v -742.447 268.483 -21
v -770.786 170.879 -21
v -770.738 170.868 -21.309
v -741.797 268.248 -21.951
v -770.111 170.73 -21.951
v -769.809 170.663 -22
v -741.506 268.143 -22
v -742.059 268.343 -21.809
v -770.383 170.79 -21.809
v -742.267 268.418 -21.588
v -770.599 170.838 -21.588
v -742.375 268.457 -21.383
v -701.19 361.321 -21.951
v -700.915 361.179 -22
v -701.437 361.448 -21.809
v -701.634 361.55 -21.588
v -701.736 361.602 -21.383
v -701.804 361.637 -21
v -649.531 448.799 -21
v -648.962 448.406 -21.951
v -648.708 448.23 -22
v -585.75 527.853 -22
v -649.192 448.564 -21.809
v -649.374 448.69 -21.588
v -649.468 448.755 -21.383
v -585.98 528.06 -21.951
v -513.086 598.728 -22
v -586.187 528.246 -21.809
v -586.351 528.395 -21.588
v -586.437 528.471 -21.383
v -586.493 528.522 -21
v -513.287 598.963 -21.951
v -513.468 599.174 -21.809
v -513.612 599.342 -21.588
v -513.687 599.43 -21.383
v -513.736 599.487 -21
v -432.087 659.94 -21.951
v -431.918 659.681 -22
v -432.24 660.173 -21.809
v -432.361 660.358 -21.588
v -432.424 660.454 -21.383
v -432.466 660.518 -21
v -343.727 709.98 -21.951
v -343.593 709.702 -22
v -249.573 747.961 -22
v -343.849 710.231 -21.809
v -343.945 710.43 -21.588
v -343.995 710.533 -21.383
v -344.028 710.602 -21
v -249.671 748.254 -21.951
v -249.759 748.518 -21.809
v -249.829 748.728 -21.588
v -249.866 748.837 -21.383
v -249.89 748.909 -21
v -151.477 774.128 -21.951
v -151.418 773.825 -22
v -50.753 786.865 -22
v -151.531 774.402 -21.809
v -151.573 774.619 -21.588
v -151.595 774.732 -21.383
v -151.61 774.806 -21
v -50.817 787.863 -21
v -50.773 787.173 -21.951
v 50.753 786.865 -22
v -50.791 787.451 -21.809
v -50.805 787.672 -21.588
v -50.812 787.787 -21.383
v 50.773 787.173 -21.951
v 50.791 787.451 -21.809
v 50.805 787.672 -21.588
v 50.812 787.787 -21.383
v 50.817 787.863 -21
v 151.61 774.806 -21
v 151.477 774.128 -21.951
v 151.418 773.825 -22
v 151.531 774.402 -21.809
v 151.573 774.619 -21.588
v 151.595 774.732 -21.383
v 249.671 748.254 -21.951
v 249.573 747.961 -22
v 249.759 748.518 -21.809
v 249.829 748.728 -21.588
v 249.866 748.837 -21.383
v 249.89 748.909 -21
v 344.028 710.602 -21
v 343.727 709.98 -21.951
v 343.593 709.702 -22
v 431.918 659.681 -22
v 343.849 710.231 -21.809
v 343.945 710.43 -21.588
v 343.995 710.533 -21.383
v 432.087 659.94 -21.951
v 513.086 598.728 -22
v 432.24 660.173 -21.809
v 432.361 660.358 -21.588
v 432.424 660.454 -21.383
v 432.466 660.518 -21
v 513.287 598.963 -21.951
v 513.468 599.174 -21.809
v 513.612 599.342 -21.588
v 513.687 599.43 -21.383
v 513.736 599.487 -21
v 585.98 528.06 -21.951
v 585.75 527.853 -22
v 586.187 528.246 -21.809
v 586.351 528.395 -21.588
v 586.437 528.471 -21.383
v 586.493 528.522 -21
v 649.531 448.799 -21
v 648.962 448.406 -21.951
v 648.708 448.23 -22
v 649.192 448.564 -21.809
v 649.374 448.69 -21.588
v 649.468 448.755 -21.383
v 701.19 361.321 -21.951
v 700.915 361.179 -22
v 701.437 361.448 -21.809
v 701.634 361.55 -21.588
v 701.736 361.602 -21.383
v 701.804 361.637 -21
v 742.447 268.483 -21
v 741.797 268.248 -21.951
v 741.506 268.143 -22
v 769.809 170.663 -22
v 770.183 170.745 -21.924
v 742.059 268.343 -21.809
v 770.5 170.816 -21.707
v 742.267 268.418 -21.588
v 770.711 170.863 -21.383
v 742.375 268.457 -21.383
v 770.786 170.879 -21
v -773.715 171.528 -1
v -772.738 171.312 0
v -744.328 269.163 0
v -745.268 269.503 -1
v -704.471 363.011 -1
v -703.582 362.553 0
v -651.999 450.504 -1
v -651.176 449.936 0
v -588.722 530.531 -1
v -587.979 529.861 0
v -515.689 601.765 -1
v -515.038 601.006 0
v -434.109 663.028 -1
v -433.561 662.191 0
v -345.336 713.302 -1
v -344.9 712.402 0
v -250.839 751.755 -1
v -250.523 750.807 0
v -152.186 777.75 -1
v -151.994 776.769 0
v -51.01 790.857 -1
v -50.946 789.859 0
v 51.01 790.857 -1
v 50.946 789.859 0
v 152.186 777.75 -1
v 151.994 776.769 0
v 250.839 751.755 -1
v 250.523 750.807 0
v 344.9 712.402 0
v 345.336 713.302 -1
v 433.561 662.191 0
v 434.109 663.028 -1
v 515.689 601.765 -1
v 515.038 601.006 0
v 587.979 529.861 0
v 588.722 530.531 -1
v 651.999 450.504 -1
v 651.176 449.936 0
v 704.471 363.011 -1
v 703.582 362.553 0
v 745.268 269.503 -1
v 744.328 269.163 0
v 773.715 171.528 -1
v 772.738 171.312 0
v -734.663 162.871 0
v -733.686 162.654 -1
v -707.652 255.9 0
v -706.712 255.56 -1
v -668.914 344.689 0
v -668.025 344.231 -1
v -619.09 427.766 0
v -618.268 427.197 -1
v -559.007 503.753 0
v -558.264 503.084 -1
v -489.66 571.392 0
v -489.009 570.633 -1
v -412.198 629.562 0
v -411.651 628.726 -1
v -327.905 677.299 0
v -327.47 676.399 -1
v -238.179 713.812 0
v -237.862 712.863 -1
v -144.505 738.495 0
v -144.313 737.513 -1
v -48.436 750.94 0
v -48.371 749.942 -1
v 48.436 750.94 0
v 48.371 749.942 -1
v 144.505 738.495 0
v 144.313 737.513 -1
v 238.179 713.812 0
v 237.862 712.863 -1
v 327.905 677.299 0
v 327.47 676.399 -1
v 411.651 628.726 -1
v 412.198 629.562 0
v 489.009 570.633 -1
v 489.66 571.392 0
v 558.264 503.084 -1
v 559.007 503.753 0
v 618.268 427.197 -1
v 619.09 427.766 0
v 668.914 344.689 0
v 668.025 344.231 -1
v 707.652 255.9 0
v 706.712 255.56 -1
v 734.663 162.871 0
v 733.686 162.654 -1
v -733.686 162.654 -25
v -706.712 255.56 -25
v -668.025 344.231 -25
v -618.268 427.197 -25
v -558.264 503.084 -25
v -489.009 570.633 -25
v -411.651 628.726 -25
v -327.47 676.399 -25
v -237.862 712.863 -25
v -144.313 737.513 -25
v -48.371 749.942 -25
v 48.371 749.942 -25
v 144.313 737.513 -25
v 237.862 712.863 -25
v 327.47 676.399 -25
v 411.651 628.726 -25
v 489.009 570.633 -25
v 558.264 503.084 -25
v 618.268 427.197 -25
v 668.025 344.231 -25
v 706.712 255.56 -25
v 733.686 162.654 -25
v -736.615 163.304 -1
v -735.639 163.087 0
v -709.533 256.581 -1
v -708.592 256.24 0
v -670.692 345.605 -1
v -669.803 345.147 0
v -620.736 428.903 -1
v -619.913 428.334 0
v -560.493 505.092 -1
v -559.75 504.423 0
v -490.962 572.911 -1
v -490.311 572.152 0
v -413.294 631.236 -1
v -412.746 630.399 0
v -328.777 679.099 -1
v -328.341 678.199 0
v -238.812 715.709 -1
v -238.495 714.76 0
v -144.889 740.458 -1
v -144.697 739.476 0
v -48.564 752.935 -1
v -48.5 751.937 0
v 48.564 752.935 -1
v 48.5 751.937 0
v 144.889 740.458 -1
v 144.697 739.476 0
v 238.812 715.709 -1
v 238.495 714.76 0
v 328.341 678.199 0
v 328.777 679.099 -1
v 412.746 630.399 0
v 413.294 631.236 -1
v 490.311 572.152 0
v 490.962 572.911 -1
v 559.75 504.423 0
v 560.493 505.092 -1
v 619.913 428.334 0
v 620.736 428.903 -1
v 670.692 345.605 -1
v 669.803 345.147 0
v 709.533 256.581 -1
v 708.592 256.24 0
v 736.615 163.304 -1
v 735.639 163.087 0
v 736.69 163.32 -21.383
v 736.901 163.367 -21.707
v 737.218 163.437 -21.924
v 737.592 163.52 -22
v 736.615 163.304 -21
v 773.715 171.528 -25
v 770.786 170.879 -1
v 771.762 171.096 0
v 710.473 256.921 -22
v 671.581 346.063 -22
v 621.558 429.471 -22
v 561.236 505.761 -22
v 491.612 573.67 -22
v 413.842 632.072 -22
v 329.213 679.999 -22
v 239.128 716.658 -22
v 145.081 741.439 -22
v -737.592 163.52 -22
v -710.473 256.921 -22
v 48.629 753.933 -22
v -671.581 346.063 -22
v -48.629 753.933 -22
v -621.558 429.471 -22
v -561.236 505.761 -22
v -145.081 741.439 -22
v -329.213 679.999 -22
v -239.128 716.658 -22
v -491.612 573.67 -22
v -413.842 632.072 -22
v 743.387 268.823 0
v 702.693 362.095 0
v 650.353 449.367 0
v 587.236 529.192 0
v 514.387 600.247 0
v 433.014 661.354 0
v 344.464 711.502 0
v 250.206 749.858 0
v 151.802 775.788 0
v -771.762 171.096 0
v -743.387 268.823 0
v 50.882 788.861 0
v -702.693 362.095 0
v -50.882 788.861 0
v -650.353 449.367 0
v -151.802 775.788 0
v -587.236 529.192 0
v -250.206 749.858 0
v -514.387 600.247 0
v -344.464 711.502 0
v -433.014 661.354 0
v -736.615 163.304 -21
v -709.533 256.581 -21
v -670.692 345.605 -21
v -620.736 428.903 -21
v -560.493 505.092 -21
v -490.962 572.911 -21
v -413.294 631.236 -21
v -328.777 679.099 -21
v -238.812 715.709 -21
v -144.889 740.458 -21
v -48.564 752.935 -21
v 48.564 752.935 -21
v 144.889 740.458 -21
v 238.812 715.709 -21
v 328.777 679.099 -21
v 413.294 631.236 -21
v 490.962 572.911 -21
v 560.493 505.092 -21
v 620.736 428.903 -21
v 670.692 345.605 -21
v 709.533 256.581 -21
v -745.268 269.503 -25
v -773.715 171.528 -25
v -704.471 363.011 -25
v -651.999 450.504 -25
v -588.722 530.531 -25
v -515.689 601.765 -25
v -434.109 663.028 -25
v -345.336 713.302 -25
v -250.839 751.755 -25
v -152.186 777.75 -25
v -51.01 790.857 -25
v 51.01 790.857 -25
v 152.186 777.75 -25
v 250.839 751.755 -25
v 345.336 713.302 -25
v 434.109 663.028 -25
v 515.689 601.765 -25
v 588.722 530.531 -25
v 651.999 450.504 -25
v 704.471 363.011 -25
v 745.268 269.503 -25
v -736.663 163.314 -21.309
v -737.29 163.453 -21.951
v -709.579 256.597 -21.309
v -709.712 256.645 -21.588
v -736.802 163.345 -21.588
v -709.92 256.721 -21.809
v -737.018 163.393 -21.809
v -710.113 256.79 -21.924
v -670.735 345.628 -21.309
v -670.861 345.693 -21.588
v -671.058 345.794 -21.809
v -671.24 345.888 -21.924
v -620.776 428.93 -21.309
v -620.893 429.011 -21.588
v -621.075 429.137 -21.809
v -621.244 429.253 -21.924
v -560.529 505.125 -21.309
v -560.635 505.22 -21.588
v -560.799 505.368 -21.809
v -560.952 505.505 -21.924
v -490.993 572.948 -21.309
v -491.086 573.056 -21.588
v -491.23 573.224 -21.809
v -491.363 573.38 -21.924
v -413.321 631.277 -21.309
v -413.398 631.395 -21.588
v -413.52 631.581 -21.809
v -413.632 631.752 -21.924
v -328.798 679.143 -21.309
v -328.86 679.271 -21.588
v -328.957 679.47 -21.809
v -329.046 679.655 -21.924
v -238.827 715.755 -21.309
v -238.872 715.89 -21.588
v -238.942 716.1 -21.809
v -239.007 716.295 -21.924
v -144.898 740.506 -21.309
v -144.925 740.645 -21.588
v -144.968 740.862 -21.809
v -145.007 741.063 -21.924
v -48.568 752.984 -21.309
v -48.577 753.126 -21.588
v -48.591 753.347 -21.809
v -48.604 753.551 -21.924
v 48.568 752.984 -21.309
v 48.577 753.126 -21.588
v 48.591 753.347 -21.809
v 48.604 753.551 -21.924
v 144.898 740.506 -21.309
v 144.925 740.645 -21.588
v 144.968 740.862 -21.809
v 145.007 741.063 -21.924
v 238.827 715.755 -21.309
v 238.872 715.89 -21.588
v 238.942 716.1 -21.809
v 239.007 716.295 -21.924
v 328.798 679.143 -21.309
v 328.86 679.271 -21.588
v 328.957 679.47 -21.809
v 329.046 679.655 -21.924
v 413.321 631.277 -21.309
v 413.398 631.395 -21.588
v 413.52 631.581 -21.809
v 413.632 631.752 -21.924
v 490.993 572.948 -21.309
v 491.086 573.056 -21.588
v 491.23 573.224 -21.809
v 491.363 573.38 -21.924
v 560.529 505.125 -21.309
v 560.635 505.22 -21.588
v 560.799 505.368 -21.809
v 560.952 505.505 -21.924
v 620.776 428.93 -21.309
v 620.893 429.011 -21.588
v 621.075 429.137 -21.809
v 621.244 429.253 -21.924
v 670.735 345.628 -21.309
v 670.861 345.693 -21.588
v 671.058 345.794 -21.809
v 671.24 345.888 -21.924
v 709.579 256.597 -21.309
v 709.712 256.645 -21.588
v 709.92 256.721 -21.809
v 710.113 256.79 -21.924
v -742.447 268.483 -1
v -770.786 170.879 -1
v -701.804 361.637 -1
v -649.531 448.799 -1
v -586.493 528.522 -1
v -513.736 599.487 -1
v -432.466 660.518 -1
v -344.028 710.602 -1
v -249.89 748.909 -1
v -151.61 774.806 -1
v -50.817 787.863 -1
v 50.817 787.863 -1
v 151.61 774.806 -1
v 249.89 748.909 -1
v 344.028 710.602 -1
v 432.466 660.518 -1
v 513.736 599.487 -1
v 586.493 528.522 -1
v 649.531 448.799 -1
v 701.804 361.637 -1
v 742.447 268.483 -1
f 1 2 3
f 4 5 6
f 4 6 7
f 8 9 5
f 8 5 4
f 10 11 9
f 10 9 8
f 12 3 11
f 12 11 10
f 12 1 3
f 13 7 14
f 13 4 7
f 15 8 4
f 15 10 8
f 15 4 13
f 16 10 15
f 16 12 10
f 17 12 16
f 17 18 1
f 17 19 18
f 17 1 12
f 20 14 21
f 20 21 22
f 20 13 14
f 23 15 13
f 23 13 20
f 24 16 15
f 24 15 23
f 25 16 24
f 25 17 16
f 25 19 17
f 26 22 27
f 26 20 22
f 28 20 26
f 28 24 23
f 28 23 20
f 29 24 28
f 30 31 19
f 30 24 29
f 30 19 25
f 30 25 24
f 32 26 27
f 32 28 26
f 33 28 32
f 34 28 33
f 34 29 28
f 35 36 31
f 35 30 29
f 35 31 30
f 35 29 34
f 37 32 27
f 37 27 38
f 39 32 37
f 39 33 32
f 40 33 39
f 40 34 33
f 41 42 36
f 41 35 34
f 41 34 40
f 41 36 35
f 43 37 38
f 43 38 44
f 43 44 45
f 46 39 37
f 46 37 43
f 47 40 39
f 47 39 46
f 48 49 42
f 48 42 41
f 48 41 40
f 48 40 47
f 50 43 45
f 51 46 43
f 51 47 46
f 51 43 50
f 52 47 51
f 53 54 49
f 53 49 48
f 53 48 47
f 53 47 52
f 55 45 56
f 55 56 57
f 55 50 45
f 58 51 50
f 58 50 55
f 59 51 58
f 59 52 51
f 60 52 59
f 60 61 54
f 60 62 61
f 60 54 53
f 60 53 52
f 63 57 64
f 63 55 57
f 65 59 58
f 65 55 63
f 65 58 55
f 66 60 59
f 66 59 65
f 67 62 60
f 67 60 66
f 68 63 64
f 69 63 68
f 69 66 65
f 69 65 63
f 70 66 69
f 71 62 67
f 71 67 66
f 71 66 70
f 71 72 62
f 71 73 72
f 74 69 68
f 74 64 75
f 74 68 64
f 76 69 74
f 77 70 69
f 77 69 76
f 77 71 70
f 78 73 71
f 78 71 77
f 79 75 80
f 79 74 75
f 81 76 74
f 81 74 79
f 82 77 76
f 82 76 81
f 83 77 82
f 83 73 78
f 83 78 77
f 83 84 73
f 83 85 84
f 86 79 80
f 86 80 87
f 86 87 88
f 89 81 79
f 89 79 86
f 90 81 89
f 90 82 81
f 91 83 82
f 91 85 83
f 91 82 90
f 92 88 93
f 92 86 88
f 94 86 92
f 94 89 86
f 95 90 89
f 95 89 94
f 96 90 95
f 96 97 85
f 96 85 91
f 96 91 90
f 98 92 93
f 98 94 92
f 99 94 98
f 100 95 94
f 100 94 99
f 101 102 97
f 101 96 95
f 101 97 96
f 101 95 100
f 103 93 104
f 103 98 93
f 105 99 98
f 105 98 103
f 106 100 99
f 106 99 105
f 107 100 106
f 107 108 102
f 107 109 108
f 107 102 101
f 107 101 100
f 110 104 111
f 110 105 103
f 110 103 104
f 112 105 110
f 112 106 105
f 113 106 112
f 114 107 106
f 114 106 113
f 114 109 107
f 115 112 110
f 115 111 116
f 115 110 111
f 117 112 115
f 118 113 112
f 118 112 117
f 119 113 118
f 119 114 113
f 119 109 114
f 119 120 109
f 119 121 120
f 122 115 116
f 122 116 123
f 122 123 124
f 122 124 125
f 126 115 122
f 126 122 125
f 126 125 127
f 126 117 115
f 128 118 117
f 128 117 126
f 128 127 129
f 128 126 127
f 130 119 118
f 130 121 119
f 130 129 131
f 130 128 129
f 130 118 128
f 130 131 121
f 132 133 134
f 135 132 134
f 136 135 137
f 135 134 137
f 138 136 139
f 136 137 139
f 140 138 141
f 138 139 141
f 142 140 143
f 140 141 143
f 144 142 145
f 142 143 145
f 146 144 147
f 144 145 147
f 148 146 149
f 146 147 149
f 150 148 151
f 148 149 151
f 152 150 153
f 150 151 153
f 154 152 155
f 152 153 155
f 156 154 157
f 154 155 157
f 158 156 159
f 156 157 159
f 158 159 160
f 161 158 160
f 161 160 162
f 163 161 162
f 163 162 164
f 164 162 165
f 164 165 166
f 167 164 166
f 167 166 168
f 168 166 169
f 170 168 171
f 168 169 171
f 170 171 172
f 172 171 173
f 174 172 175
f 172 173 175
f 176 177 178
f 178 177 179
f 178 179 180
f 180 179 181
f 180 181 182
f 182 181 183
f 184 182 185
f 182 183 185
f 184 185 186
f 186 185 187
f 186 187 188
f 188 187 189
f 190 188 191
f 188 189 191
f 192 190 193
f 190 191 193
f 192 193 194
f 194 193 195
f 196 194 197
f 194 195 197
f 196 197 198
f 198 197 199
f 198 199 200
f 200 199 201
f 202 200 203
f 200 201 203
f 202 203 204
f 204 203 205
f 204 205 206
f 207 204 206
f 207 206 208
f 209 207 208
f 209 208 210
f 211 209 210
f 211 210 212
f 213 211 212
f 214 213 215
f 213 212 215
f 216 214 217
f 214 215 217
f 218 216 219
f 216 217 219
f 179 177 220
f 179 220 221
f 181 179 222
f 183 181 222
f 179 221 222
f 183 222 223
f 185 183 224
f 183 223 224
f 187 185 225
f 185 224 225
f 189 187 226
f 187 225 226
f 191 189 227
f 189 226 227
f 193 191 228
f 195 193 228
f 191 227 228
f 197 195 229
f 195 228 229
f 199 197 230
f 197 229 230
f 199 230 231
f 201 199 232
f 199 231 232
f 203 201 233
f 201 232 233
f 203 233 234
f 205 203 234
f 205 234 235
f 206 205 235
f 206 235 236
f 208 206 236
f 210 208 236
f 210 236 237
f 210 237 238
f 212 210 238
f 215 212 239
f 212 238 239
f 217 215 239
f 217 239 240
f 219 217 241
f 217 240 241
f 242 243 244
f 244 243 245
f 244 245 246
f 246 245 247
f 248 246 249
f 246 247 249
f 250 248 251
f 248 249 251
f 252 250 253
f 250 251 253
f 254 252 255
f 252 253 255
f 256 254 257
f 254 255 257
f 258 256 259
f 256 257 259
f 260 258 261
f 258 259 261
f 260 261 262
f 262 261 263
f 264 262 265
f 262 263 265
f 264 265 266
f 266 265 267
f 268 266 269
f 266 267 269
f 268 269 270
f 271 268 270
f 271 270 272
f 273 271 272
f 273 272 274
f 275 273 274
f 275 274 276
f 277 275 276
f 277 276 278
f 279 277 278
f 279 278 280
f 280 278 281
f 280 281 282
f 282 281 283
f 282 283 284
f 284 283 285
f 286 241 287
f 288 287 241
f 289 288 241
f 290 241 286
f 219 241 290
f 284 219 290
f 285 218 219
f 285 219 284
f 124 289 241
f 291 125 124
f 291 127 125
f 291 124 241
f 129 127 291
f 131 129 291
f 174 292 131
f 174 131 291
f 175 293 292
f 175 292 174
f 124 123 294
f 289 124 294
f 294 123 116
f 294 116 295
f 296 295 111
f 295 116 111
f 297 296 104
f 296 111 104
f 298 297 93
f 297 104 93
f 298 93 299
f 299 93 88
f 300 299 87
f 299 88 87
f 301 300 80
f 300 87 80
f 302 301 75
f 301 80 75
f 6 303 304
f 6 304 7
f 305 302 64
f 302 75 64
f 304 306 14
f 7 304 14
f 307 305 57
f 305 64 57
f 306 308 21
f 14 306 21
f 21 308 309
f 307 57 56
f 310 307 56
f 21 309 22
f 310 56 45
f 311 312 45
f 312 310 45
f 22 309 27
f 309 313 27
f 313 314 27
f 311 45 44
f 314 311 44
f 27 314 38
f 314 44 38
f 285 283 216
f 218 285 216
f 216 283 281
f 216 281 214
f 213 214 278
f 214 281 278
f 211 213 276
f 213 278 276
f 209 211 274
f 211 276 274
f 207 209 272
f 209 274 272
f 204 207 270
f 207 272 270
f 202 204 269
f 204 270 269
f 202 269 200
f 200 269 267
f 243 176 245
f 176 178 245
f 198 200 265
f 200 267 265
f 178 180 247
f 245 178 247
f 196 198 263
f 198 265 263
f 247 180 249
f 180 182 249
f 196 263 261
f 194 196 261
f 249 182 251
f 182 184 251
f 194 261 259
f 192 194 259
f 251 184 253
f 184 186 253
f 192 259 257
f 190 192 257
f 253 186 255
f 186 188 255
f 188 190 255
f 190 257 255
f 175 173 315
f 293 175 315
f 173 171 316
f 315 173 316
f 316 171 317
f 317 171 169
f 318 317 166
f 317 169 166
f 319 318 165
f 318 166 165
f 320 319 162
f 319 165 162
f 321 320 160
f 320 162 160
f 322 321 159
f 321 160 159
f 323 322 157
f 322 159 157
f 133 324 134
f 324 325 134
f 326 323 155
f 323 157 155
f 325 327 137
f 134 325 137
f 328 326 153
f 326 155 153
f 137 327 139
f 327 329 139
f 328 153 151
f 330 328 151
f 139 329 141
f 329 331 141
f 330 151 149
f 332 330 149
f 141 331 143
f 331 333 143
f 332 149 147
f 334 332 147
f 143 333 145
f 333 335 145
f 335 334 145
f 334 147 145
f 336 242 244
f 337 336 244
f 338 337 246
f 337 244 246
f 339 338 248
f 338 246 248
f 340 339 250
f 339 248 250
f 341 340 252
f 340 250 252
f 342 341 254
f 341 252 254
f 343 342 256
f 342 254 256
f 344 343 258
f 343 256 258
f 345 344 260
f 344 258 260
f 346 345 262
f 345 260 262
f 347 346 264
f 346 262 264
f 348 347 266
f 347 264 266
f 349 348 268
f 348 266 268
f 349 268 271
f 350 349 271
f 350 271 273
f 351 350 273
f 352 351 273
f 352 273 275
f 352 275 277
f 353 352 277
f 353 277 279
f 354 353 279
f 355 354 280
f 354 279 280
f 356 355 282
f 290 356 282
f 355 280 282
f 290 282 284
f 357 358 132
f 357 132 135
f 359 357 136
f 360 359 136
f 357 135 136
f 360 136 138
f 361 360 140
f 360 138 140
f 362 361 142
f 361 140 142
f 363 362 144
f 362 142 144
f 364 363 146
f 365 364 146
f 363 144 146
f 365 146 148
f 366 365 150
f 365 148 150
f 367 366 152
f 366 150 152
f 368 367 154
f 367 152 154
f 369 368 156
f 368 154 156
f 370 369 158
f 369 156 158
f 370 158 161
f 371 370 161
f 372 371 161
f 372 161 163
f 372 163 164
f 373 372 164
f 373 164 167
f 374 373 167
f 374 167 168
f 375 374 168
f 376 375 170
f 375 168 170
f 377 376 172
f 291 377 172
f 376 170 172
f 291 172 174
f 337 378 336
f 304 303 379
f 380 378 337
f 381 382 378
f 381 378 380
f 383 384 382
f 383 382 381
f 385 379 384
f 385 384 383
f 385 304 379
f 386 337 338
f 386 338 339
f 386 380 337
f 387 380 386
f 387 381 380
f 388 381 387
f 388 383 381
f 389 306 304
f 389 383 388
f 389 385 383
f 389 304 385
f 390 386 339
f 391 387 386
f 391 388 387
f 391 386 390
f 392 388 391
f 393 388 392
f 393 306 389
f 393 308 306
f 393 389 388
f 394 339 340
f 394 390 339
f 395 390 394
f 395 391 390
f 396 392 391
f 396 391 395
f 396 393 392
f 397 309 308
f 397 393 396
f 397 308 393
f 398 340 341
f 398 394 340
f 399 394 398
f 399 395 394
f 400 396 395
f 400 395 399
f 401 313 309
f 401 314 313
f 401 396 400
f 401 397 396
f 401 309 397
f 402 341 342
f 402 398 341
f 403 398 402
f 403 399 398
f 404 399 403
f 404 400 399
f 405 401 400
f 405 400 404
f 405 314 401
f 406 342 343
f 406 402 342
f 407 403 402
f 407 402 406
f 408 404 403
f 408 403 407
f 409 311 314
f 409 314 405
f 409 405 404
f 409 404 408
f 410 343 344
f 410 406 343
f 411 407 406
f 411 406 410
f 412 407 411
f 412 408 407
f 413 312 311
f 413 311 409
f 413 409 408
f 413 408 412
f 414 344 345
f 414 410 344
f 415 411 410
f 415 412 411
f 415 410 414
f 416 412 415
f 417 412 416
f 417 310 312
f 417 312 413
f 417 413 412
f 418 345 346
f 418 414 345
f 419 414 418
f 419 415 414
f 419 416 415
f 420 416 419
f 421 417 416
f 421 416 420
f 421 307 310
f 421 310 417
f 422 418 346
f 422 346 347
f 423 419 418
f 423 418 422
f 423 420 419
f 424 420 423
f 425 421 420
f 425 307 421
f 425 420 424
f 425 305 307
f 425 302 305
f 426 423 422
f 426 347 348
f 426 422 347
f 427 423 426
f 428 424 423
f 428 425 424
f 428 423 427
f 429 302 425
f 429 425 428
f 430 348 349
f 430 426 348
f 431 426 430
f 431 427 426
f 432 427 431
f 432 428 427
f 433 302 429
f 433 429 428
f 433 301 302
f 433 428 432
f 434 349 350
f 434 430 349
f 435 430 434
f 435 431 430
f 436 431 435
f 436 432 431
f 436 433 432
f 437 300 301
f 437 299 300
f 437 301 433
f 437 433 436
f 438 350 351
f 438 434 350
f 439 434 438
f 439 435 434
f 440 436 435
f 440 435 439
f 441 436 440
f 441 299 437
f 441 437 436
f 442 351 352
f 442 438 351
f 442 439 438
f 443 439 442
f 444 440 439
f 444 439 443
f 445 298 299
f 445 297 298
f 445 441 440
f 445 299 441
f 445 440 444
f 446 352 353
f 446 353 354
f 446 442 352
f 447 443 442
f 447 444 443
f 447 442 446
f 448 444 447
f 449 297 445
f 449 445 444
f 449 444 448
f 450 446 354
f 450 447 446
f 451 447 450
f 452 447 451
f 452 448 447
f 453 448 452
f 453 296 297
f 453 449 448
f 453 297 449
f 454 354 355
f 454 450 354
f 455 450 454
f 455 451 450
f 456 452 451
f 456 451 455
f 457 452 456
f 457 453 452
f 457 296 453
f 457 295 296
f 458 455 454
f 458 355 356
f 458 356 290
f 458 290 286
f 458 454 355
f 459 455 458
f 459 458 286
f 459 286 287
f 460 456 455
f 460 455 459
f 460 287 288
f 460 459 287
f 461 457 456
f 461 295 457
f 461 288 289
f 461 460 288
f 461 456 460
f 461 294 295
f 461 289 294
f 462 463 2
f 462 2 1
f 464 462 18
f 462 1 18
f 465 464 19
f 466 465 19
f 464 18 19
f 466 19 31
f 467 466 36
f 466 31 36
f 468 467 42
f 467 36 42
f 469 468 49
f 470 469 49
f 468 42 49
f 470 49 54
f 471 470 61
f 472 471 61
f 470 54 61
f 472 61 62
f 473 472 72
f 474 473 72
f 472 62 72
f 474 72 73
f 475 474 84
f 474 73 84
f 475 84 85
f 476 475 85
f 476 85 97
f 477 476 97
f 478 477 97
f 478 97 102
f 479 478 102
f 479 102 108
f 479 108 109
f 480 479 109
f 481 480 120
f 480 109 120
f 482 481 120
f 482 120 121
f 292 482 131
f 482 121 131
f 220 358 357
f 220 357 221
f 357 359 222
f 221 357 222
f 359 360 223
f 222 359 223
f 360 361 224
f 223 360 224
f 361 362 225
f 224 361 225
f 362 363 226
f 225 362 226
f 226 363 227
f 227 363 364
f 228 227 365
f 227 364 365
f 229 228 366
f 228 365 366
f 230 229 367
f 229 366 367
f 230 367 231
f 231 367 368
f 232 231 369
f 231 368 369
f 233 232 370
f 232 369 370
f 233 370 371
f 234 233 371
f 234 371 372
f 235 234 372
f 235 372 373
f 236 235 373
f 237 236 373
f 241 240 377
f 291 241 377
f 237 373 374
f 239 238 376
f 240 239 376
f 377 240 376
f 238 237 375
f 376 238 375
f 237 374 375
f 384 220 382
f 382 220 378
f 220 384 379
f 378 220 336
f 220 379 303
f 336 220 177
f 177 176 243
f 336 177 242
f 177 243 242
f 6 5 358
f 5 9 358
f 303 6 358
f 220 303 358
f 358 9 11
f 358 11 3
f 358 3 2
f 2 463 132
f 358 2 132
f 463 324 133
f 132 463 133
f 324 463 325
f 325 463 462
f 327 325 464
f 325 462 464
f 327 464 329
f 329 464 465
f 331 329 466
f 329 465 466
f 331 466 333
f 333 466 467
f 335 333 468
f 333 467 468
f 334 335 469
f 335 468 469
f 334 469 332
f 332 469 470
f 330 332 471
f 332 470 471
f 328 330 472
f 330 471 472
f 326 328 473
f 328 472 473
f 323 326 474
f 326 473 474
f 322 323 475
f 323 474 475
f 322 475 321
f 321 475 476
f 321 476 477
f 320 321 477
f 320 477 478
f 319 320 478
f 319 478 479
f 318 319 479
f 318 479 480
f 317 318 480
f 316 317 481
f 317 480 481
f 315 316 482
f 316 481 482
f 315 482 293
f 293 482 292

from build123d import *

# Parameters (mm, degrees)
F2_ANGLE_BACK = 77.5
F2_ANGLE      = 155
F3_SIZE       = 1
F4_R          = 1


with BuildPart() as f2:
    # F1 (on Right) → F2 (revolve)
    with BuildSketch(Plane.YZ, mode=Mode.PRIVATE) as f2_sk:
        Polygon((754.5, -22), (754.5, 0), (751.5, 0), (751.5, -25), (792.5, -25), (792.5, 0), (789.5, 0), (789.5, -22), align=None)
    revolve(f2_sk.sketch.rotate(Axis((0, 0, -26.4390427619), (0, 0, -1)), -F2_ANGLE_BACK), axis=Axis((0, 0, -26.4390427619), (0, 0, -1)), revolution_arc=F2_ANGLE)

    # F3
    f3_edges = [f2.edges().sort_by_distance(p)[0] for p in [
        (0, 789.5, 0),
        (0, 792.5, 0),
        (0, 751.5, 0),
        (0, 754.5, 0),
    ]]
    chamfer(f3_edges, length=F3_SIZE)

    # F4
    f4_edges = [f2.edges().sort_by_distance(p)[0] for p in [
        (0, 789.5, -22),
        (0, 754.5, -22),
    ]]
    fillet(f4_edges, radius=F4_R)


solid = f2.part
